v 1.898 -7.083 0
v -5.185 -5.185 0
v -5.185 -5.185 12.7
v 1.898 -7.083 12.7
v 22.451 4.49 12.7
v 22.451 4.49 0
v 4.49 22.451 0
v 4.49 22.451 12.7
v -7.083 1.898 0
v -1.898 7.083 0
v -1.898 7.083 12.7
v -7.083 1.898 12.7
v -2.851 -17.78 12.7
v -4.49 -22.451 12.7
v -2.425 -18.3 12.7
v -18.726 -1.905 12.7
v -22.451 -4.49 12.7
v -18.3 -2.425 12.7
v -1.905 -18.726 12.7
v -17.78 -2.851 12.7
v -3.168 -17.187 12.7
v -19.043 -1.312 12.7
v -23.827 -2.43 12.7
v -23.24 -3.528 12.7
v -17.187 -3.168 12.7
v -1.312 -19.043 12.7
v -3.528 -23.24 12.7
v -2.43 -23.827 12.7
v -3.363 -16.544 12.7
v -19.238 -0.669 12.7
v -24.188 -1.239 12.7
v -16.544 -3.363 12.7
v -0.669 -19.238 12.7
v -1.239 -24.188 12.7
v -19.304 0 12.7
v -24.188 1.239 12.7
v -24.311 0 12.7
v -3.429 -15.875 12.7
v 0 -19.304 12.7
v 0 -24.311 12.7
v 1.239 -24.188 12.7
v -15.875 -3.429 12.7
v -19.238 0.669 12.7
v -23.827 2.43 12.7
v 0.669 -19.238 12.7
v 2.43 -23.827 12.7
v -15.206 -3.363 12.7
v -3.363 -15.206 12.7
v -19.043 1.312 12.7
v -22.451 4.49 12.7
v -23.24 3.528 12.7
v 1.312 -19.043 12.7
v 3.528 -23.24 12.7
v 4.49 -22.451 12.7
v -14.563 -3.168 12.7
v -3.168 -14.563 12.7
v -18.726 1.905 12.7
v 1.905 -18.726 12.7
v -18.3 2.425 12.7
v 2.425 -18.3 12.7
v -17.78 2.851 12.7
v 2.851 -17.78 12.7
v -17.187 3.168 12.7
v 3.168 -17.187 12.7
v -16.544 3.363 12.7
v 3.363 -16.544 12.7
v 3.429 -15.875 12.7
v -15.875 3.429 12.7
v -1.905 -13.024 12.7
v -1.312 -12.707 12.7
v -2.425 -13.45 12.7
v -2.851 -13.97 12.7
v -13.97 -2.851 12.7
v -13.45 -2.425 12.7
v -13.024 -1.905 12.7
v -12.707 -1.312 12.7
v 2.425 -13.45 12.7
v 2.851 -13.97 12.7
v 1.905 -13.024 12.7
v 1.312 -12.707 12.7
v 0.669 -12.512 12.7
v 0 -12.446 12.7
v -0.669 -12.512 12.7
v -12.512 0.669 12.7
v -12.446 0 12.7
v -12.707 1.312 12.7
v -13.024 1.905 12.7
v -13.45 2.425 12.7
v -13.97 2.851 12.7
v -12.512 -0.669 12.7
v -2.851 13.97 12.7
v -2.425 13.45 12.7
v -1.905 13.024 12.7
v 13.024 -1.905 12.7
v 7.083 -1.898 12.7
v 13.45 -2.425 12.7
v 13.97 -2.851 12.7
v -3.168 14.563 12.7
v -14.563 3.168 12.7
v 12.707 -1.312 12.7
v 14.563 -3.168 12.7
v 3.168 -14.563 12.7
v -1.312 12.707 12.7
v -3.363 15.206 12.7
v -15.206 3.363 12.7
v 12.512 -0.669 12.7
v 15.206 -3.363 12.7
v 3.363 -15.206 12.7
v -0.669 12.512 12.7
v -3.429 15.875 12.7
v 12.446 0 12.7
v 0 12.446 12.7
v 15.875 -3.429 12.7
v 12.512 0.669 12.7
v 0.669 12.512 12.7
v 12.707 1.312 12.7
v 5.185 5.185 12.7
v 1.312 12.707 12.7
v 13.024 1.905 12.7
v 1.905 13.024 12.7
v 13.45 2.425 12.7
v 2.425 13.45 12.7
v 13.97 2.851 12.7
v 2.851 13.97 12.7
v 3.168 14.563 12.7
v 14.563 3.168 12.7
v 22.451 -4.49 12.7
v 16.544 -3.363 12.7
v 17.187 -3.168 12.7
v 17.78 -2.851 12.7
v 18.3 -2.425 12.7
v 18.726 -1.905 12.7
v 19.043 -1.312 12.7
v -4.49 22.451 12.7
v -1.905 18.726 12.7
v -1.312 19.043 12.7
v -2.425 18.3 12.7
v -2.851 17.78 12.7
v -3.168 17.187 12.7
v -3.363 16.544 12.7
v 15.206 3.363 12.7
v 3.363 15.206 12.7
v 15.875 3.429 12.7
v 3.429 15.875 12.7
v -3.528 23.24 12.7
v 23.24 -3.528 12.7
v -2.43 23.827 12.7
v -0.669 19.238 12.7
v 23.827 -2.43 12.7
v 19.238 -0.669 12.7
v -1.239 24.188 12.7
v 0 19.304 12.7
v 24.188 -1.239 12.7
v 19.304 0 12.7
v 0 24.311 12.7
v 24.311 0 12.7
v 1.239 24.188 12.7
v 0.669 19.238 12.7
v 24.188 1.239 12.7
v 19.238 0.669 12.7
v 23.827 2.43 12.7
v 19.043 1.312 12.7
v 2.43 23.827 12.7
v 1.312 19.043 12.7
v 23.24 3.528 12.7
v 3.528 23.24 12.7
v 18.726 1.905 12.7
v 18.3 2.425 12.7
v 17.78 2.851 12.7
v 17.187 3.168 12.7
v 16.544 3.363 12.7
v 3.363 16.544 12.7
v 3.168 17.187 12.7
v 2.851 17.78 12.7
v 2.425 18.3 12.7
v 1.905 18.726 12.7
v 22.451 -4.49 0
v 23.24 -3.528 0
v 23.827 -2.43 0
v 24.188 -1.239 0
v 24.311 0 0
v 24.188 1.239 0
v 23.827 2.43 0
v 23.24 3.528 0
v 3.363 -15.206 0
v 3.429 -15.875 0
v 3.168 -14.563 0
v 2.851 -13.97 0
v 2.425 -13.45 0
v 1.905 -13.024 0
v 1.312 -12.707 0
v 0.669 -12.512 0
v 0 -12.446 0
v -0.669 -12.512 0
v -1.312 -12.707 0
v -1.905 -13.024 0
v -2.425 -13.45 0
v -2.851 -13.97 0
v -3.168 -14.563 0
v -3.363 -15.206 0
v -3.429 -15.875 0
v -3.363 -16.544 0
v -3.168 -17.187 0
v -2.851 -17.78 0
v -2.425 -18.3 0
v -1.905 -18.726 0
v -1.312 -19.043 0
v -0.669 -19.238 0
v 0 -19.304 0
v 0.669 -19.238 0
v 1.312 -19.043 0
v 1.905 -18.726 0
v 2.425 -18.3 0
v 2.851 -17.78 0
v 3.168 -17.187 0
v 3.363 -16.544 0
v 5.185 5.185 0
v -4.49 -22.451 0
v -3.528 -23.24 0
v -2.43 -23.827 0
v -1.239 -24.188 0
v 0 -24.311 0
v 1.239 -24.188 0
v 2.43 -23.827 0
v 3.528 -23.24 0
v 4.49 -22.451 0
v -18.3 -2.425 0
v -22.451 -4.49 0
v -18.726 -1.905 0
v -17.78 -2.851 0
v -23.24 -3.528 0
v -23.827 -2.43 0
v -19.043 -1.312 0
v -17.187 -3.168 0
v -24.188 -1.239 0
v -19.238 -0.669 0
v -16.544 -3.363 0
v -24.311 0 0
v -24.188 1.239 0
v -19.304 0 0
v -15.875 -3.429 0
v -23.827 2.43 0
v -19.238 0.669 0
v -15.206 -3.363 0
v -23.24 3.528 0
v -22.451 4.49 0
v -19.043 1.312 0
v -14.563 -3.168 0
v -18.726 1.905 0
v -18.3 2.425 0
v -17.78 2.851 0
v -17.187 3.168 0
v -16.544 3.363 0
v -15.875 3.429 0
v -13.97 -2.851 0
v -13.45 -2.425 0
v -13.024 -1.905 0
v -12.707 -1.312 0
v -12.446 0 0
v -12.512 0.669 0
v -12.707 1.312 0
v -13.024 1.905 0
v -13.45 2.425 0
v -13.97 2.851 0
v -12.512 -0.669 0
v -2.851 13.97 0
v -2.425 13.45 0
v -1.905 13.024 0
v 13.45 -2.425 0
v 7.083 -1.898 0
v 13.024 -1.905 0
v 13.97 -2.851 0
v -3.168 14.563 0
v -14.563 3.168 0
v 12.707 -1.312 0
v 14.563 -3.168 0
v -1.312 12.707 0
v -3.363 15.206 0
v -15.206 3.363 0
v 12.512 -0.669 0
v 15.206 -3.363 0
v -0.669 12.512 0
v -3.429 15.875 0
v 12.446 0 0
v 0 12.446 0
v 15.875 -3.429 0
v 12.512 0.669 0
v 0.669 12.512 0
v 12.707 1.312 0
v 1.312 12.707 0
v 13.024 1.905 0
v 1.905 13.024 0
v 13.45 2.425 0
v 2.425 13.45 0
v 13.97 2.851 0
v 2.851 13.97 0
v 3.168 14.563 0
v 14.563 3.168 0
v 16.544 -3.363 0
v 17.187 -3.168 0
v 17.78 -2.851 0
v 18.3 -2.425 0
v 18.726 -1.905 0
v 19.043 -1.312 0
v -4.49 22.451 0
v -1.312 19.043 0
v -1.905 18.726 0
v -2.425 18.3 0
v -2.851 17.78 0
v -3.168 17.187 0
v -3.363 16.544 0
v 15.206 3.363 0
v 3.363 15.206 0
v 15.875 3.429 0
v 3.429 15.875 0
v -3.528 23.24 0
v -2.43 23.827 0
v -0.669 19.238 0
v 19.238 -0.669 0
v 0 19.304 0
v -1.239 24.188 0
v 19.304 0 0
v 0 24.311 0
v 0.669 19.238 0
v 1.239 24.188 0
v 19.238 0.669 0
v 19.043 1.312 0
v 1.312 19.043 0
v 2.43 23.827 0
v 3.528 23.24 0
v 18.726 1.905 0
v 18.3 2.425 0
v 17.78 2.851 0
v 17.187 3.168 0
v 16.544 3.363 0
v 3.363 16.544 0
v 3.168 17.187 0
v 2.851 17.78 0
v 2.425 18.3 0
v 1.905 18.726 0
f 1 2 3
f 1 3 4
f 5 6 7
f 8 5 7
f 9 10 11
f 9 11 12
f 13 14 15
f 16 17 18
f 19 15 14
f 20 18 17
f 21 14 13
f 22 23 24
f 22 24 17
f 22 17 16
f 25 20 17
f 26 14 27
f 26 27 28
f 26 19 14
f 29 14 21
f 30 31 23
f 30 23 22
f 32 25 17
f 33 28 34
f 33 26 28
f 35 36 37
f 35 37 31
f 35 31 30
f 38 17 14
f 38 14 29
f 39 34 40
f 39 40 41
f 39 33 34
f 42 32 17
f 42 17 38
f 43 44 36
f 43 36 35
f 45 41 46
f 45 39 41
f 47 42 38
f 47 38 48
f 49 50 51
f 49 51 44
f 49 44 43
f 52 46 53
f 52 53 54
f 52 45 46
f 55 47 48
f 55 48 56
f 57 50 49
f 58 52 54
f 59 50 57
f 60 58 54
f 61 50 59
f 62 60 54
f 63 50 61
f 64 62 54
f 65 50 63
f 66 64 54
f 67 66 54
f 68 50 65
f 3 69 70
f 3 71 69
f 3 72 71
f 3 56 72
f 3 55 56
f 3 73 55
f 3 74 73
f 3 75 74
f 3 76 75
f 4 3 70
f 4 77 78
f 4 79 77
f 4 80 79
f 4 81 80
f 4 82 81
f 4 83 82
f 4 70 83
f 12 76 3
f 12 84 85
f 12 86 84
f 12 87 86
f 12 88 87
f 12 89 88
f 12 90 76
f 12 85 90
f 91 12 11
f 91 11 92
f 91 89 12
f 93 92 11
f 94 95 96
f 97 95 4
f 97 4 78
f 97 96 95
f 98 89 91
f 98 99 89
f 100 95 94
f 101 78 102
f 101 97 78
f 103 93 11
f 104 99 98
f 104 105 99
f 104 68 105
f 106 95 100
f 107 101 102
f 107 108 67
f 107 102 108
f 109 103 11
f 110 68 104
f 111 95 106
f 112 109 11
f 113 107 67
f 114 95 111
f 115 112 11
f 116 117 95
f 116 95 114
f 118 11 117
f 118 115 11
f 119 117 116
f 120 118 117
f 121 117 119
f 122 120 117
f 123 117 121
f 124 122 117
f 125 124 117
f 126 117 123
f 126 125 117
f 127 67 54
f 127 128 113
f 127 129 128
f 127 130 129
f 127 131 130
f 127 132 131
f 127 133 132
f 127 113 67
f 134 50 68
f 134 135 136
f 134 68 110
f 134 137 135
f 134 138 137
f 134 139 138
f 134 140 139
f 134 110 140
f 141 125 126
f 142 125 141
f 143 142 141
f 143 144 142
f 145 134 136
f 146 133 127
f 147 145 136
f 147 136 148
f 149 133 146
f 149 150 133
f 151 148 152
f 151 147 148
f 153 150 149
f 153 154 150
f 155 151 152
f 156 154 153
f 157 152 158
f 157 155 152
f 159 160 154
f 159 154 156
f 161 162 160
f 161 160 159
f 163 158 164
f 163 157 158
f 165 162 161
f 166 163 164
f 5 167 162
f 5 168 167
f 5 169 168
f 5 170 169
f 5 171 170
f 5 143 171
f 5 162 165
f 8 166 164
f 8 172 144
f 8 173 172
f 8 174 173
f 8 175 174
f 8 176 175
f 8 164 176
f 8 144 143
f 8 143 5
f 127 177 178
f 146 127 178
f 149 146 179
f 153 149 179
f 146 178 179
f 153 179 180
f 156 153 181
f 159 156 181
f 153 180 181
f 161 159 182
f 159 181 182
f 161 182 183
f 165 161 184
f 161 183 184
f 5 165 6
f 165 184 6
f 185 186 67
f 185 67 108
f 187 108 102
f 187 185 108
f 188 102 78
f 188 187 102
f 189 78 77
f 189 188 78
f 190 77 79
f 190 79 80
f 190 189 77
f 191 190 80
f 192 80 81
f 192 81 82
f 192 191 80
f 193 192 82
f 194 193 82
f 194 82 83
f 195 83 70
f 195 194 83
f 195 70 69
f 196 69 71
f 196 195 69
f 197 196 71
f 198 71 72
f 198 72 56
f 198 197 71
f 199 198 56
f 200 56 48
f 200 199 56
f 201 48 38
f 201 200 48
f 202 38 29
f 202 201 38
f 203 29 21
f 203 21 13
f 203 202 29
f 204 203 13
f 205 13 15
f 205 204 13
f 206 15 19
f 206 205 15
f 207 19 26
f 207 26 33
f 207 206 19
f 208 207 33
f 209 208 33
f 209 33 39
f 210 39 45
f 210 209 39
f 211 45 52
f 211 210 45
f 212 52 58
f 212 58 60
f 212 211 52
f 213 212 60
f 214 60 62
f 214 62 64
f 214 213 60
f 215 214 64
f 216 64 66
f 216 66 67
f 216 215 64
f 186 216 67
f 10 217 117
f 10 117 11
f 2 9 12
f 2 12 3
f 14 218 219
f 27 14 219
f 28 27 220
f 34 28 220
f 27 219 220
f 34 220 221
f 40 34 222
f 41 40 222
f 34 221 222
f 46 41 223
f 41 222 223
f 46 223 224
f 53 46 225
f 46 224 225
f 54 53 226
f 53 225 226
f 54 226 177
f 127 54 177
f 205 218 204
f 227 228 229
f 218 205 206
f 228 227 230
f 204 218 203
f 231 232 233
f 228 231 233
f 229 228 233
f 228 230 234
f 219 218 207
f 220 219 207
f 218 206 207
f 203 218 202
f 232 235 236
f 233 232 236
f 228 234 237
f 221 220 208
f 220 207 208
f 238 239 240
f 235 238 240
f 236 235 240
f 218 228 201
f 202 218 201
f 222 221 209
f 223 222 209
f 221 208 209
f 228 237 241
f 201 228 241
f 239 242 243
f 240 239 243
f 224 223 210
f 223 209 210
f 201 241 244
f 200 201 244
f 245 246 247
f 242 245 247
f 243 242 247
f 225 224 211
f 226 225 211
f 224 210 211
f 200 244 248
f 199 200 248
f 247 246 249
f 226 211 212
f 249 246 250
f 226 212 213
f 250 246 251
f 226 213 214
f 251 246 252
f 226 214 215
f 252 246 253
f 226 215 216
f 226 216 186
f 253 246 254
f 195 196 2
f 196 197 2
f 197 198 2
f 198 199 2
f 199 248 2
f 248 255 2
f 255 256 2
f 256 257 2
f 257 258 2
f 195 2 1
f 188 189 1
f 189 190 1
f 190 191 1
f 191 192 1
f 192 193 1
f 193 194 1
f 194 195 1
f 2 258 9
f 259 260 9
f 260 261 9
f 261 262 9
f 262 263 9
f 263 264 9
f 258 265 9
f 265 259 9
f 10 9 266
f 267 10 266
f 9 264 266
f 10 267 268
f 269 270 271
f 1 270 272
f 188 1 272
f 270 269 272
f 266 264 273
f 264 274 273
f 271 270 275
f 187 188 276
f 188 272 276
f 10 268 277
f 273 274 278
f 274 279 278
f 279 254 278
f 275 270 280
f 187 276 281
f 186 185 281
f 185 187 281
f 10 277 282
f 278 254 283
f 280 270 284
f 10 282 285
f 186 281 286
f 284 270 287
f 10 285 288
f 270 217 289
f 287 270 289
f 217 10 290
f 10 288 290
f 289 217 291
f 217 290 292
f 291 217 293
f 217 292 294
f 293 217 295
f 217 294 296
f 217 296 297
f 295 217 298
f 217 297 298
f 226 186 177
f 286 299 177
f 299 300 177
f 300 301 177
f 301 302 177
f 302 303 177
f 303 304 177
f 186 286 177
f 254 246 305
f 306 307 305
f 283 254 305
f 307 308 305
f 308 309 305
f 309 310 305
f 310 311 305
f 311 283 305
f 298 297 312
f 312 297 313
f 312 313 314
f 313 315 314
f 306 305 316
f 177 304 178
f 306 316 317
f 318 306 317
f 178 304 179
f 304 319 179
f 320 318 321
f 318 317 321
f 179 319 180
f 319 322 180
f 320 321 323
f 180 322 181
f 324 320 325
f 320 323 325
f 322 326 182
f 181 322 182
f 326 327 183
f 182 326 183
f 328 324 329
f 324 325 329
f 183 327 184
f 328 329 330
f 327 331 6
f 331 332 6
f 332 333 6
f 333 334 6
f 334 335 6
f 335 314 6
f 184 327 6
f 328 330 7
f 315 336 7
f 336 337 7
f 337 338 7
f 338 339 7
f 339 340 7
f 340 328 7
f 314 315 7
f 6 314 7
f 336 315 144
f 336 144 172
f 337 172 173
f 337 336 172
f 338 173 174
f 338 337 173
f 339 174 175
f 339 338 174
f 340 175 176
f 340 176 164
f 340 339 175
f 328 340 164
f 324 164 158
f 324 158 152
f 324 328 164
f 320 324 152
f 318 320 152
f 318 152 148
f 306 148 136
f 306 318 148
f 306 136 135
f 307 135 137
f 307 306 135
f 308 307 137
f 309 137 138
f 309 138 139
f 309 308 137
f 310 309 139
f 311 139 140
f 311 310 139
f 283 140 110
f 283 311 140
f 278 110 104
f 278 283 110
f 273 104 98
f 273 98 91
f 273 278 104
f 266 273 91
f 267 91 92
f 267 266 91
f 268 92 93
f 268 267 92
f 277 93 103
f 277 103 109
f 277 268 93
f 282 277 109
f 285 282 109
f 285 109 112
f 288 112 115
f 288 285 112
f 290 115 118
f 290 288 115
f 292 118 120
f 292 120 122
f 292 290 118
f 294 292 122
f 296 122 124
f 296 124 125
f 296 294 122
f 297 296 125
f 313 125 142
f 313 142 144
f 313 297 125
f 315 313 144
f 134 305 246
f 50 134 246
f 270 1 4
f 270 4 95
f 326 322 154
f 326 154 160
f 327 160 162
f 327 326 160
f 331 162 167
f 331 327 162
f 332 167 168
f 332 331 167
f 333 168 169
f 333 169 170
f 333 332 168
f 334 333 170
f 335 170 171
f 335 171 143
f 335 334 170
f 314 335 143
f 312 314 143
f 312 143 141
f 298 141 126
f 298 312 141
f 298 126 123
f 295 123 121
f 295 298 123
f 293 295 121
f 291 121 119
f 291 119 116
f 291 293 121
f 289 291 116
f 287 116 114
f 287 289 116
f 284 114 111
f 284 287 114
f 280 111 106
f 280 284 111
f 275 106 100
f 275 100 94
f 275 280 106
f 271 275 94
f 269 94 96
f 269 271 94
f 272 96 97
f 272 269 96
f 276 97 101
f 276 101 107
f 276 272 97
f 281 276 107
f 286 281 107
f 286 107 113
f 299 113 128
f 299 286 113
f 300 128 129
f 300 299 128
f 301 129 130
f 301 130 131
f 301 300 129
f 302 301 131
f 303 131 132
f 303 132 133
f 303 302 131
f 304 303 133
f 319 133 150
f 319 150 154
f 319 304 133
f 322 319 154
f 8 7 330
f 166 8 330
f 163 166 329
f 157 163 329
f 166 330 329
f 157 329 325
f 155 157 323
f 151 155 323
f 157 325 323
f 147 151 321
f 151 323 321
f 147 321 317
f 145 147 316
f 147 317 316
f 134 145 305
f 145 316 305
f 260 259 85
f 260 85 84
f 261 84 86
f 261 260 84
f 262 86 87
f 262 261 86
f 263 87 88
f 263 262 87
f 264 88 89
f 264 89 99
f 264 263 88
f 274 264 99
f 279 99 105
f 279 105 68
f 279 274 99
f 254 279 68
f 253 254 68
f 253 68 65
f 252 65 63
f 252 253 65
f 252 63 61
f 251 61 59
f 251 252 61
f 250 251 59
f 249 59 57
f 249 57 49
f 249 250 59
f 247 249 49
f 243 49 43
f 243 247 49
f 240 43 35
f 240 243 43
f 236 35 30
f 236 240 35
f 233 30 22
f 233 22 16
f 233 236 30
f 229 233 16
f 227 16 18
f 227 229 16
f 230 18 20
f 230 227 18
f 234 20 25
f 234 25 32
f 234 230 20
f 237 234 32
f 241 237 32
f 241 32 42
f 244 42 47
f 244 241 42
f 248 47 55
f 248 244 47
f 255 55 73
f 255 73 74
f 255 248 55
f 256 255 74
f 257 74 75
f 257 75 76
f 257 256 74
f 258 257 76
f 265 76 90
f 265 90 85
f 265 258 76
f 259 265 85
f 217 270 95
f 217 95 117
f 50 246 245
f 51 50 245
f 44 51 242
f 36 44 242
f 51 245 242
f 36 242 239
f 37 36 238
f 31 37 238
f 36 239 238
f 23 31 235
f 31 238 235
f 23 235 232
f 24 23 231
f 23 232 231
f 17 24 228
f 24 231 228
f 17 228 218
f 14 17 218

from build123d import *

# Parameters (mm, degrees)
SKETCH2_R           = 3.429
BOSS_EXTRUDE1_DEPTH = 12.7


with BuildPart() as part:
    # Sketch2 → Boss-Extrude1 (new body)
    with BuildSketch(Plane.XY):
        with BuildLine():
            Line((-4.490128061, 22.450640303), (-22.450640303, 4.490128061))
            ThreePointArc((-22.450640303, 4.490128061), (-24.310512242, 0), (-22.450640303, -4.490128061))
            Line((-22.450640303, -4.490128061), (-4.490128061, -22.450640303))
            ThreePointArc((-4.490128061, -22.450640303), (0, -24.310512242), (4.490128061, -22.450640303))
            Line((4.490128061, -22.450640303), (22.450640303, -4.490128061))
            ThreePointArc((22.450640303, -4.490128061), (24.310512242, 0), (22.450640303, 4.490128061))
            Line((22.450640303, 4.490128061), (4.490128061, 22.450640303))
            ThreePointArc((4.490128061, 22.450640303), (0, 24.310512242), (-4.490128061, 22.450640303))
        make_face()
        with Locations((0, 15.875)):
            Circle(SKETCH2_R, mode=Mode.SUBTRACT)
        with Locations((15.875, 0)):
            Circle(SKETCH2_R, mode=Mode.SUBTRACT)
        with Locations((0, -15.875)):
            Circle(SKETCH2_R, mode=Mode.SUBTRACT)
        with Locations((-15.875, 0)):
            Circle(SKETCH2_R, mode=Mode.SUBTRACT)
        Polygon((5.184753289, 5.184753289), (-1.897751416, 7.082504705), (-7.082504705, 1.897751416), (-5.184753289, -5.184753289), (1.897751416, -7.082504705), (7.082504705, -1.897751416), align=None, mode=Mode.SUBTRACT)
    extrude(amount=BOSS_EXTRUDE1_DEPTH)


solid = part.part
